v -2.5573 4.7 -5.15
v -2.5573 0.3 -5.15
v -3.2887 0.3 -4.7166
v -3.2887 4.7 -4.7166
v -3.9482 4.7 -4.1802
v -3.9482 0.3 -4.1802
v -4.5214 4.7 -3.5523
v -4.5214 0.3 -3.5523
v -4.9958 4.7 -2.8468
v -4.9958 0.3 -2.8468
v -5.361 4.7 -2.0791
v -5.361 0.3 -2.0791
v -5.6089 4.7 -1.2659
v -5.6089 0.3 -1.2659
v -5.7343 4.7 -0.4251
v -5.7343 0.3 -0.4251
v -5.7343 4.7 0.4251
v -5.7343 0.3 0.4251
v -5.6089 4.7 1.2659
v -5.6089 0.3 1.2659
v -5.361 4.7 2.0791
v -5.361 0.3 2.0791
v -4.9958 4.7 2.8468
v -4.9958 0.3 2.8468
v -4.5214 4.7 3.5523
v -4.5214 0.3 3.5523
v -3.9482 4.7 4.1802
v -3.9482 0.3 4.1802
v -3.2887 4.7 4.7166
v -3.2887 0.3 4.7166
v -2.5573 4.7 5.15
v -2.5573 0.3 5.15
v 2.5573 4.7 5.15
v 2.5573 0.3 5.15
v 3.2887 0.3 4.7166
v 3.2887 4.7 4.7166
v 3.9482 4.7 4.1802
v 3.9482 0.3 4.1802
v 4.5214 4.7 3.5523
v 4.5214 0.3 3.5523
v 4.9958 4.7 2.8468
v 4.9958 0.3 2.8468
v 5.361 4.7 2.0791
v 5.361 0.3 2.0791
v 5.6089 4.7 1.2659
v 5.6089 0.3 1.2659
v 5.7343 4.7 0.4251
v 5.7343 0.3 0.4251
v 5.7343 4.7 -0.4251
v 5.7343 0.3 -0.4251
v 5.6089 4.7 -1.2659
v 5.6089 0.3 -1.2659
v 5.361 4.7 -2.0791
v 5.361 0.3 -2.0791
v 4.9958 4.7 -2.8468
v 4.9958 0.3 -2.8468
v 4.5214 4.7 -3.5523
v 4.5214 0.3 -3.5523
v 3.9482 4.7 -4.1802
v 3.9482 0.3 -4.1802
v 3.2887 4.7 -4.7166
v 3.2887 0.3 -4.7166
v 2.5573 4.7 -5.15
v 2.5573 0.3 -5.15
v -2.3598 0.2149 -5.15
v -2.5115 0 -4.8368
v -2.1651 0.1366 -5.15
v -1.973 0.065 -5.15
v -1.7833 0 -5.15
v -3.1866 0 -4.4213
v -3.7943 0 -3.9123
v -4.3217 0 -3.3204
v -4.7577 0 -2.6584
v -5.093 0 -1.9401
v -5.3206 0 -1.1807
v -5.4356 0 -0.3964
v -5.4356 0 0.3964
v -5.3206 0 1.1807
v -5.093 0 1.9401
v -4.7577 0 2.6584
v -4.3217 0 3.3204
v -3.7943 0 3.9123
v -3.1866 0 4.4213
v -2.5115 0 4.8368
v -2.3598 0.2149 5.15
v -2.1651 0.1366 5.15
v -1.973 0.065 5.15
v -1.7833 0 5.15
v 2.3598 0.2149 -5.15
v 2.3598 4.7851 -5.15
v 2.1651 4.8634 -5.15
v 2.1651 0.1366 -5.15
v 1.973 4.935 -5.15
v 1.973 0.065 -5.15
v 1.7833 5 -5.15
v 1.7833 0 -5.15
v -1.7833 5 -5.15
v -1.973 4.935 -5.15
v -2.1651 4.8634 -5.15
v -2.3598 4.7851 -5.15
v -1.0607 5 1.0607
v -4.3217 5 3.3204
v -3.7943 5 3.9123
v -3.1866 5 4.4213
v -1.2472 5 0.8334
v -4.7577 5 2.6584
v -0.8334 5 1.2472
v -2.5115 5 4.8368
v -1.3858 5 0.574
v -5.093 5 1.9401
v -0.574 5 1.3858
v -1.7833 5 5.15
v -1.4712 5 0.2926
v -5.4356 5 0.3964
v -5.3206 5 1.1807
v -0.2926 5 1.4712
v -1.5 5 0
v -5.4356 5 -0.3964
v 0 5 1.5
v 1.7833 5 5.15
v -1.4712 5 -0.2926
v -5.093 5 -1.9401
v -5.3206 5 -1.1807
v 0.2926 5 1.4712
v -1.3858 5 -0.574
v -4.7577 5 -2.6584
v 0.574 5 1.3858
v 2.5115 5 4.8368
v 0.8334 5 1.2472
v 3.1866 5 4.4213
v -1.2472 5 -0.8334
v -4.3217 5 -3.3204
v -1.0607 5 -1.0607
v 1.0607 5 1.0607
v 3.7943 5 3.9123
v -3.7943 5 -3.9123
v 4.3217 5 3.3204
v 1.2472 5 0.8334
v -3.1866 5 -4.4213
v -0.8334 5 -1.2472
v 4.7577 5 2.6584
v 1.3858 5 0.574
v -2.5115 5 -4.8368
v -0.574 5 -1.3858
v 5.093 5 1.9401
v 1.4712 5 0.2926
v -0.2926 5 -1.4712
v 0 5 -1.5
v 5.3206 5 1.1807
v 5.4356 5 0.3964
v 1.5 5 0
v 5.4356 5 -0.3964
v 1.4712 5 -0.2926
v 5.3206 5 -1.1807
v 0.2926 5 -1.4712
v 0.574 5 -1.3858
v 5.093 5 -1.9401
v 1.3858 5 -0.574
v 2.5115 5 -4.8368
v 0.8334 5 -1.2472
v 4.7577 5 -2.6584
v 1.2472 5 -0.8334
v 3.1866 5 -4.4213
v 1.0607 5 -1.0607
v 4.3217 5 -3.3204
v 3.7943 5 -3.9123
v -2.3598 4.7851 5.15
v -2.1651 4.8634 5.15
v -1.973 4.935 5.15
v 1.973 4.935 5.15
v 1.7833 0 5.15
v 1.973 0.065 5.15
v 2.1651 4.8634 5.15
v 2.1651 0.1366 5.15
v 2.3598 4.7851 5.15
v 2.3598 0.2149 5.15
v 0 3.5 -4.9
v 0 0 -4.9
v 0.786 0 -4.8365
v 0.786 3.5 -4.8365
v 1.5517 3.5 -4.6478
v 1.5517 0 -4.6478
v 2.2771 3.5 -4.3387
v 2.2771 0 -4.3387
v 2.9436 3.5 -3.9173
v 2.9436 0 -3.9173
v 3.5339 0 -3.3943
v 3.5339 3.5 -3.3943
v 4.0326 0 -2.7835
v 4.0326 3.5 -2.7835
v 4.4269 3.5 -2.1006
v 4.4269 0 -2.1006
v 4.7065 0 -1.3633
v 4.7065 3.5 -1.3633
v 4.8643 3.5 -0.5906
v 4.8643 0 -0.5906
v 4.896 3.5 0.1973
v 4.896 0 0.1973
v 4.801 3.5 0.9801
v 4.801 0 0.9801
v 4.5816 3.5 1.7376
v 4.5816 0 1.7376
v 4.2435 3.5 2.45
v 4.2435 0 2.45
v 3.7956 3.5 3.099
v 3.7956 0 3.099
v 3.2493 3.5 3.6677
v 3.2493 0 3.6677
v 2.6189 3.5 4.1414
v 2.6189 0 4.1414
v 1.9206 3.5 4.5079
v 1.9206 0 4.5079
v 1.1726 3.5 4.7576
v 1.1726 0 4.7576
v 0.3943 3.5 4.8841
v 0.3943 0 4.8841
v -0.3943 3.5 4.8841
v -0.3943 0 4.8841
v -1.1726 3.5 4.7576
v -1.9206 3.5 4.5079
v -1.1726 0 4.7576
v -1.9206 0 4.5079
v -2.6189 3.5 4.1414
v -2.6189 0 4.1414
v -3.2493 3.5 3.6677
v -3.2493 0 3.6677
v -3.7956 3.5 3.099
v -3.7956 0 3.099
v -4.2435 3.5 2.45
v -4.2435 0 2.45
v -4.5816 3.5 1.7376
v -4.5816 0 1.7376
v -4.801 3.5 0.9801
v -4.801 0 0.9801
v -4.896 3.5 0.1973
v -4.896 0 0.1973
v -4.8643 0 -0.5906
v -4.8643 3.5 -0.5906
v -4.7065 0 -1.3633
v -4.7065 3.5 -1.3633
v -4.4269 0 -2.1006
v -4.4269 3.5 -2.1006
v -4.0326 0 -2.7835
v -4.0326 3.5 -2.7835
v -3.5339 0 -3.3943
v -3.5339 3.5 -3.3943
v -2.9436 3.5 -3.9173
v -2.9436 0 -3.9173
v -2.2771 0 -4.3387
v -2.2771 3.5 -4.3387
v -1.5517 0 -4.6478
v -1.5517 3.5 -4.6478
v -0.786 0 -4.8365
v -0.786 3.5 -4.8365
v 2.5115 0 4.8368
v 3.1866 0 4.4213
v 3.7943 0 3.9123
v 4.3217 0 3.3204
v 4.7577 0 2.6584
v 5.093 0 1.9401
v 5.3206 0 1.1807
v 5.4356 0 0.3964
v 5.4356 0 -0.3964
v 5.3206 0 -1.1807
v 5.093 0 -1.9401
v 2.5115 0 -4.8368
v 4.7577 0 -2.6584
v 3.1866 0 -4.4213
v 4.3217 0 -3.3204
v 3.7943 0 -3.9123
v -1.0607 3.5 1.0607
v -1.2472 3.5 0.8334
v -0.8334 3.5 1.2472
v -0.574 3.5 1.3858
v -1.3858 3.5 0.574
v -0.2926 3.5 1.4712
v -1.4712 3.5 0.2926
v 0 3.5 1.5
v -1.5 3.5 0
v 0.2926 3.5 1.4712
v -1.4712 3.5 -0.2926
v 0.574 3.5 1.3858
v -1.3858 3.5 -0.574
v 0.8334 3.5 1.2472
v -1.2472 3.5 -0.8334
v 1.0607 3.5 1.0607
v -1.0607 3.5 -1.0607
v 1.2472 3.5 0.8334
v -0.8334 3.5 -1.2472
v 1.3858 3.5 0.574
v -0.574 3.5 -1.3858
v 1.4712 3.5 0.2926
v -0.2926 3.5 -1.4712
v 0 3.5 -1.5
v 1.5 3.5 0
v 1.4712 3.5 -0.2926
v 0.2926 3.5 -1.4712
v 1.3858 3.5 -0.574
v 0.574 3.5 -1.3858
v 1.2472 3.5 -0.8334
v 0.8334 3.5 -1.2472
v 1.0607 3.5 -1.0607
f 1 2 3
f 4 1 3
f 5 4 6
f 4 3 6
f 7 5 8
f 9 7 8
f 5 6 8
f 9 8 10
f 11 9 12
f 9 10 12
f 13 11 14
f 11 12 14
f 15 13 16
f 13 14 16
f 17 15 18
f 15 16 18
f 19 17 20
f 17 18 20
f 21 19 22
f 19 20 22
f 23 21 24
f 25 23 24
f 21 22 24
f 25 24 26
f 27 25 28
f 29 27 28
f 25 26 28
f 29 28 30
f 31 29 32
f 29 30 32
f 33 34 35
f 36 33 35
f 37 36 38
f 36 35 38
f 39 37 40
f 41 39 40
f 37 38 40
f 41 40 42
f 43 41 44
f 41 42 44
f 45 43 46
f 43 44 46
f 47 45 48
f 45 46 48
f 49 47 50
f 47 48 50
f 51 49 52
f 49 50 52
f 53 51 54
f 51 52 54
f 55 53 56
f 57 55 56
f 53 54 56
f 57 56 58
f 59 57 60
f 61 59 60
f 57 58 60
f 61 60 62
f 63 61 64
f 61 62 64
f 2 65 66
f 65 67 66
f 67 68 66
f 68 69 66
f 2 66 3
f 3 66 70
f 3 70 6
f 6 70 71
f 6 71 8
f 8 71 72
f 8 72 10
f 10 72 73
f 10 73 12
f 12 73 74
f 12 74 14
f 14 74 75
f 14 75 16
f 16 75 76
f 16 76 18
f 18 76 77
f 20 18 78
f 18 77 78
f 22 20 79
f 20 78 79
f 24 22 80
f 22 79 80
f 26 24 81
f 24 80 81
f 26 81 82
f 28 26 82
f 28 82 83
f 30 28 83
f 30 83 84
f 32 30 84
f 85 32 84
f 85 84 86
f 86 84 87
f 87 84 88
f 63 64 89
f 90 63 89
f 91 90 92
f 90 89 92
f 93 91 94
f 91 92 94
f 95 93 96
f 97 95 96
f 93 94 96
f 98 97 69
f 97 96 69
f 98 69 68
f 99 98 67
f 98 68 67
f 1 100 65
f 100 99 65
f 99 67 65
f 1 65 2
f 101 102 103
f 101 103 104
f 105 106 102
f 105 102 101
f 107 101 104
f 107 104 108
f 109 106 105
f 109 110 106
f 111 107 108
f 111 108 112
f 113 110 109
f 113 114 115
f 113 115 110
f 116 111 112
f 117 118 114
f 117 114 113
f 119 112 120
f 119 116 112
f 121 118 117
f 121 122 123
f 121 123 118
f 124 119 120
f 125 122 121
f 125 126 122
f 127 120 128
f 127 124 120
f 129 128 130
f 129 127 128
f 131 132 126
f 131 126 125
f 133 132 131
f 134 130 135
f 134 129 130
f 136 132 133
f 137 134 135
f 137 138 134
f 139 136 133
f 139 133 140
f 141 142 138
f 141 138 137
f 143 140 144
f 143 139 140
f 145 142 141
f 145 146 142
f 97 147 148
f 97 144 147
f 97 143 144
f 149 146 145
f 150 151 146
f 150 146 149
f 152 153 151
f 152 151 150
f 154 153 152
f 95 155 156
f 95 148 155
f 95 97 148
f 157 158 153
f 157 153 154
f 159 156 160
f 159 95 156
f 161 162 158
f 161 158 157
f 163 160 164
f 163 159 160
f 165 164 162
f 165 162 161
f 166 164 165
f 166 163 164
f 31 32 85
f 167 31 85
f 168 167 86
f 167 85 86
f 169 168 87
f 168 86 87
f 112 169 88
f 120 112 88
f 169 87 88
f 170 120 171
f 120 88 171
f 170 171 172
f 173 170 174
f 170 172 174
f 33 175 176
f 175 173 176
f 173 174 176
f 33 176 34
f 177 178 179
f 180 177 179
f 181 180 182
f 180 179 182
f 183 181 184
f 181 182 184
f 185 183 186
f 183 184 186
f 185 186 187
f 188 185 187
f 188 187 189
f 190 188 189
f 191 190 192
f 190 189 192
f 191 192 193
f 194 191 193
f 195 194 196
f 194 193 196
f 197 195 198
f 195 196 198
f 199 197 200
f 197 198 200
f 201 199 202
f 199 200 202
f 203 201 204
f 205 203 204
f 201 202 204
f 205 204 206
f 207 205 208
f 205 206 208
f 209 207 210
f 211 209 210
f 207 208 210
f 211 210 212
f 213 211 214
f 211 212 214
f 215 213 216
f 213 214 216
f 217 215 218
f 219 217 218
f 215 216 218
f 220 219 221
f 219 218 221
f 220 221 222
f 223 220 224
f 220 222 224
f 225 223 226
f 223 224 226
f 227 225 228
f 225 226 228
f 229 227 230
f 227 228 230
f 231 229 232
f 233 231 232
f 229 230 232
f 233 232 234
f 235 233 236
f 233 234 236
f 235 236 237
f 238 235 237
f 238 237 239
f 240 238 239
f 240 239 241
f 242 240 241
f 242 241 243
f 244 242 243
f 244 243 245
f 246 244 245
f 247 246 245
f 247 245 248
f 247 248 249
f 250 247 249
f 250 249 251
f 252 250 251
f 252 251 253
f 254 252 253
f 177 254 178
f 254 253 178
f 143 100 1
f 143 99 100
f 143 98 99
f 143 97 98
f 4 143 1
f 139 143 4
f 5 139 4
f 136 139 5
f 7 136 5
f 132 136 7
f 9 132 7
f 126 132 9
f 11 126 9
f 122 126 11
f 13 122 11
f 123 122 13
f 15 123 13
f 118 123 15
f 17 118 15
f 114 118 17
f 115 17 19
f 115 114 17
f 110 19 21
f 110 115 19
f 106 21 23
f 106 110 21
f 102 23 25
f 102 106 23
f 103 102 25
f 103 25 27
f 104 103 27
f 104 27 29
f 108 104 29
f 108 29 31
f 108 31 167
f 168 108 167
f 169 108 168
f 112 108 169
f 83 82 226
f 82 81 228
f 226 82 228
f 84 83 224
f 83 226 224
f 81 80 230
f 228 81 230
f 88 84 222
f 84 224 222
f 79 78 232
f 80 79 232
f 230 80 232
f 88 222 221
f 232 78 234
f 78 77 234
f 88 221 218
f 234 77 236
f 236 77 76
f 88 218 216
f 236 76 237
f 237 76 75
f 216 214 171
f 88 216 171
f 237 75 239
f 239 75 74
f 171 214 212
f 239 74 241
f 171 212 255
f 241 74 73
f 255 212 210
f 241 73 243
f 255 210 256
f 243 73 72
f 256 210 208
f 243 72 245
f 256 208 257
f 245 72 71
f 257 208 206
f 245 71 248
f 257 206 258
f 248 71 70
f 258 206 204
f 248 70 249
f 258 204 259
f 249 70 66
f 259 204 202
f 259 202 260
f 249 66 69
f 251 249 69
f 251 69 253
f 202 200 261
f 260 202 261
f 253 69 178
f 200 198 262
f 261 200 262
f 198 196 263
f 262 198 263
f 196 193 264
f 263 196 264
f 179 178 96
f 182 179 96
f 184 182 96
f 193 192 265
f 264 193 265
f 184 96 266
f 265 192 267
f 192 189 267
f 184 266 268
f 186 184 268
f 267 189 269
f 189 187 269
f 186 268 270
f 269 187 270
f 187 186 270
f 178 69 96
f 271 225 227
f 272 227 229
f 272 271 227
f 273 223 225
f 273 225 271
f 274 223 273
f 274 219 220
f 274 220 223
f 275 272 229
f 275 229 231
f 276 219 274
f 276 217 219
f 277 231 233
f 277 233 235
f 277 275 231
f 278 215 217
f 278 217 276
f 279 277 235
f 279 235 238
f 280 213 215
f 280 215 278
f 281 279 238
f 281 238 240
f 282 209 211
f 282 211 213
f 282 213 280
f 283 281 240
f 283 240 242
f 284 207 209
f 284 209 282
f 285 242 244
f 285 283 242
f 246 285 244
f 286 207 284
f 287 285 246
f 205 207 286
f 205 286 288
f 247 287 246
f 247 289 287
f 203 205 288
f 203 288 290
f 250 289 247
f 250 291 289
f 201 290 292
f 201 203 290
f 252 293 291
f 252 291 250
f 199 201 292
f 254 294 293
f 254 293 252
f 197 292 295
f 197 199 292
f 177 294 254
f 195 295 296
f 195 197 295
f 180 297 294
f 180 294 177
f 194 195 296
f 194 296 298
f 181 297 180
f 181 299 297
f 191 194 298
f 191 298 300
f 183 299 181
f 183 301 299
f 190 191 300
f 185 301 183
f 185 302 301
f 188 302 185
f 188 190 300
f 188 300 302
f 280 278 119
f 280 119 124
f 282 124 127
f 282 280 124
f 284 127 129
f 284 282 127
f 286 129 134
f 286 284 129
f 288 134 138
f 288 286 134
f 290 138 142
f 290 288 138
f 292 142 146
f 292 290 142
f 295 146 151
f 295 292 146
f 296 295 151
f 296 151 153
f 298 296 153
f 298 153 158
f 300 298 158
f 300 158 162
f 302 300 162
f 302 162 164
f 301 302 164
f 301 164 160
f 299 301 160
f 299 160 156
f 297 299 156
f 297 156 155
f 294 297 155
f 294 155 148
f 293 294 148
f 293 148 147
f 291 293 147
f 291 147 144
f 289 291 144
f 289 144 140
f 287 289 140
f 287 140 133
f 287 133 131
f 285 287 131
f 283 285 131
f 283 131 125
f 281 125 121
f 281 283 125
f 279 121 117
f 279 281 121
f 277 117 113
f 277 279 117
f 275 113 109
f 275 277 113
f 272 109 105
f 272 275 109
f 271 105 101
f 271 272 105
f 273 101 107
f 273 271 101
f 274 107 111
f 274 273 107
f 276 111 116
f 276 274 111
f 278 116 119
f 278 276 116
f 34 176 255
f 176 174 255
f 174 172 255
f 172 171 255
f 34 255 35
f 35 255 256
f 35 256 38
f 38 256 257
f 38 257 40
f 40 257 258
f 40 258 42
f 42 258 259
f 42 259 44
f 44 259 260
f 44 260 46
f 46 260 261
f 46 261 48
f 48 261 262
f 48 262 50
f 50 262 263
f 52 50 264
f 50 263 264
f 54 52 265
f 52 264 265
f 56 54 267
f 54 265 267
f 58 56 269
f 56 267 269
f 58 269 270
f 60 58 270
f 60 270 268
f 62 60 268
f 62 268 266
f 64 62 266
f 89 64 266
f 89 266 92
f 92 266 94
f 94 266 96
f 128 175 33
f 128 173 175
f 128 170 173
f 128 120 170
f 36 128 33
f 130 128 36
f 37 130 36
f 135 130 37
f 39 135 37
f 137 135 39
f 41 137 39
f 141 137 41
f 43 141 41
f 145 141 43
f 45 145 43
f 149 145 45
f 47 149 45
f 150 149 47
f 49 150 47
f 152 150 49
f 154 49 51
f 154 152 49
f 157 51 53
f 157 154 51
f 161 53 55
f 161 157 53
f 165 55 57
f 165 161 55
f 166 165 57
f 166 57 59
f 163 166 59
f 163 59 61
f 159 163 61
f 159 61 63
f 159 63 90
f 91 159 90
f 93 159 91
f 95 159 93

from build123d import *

# Parameters (mm, degrees)
SKETCH_1_R          = 1.5
EXTRUDE_1_DEPTH     = 5
SKETCH_2_R          = 4.9
CUT_EXTRUDE_1_DEPTH = 3.5
CHAMFER_1_SIZE      = 0.3


with BuildPart() as part:
    # ｽｹｯﾁ1 → ﾎﾞｽ - 押し出し1 (new body)
    with BuildSketch(Plane(origin=(0, 0, 0), x_dir=(1, 0, 0), z_dir=(0, 1, 0))):
        with BuildLine():
            Line((-2.557342371, -5.15), (2.557342371, -5.15))
            ThreePointArc((2.557342371, -5.15), (5.75, 0), (2.557342371, 5.15))
            Line((2.557342371, 5.15), (-2.557342371, 5.15))
            ThreePointArc((-2.557342371, 5.15), (-5.75, 0), (-2.557342371, -5.15))
        make_face()
        with Locations(Location((0, 0, 0), (0, 0, 270))):
            Circle(SKETCH_1_R, mode=Mode.SUBTRACT)
    extrude(amount=EXTRUDE_1_DEPTH)

    # ｽｹｯﾁ2 → ｶｯﾄ - 押し出し1 (cut)
    with BuildSketch(Plane.XZ):
        with Locations(Location((0, 0, 0), (0, 0, 270))):
            Circle(SKETCH_2_R)
    extrude(amount=-CUT_EXTRUDE_1_DEPTH, mode=Mode.SUBTRACT)

    # 面取り1
    chamfer_1_edges = [part.edges().sort_by_distance(p)[0] for p in [
        (5.75, 5, 0),
        (-5.75, 5, 0),
        (5.75, 0, 0),
        (-5.75, 0, 0),
    ]]
    chamfer(chamfer_1_edges, length=CHAMFER_1_SIZE)


solid = part.part
